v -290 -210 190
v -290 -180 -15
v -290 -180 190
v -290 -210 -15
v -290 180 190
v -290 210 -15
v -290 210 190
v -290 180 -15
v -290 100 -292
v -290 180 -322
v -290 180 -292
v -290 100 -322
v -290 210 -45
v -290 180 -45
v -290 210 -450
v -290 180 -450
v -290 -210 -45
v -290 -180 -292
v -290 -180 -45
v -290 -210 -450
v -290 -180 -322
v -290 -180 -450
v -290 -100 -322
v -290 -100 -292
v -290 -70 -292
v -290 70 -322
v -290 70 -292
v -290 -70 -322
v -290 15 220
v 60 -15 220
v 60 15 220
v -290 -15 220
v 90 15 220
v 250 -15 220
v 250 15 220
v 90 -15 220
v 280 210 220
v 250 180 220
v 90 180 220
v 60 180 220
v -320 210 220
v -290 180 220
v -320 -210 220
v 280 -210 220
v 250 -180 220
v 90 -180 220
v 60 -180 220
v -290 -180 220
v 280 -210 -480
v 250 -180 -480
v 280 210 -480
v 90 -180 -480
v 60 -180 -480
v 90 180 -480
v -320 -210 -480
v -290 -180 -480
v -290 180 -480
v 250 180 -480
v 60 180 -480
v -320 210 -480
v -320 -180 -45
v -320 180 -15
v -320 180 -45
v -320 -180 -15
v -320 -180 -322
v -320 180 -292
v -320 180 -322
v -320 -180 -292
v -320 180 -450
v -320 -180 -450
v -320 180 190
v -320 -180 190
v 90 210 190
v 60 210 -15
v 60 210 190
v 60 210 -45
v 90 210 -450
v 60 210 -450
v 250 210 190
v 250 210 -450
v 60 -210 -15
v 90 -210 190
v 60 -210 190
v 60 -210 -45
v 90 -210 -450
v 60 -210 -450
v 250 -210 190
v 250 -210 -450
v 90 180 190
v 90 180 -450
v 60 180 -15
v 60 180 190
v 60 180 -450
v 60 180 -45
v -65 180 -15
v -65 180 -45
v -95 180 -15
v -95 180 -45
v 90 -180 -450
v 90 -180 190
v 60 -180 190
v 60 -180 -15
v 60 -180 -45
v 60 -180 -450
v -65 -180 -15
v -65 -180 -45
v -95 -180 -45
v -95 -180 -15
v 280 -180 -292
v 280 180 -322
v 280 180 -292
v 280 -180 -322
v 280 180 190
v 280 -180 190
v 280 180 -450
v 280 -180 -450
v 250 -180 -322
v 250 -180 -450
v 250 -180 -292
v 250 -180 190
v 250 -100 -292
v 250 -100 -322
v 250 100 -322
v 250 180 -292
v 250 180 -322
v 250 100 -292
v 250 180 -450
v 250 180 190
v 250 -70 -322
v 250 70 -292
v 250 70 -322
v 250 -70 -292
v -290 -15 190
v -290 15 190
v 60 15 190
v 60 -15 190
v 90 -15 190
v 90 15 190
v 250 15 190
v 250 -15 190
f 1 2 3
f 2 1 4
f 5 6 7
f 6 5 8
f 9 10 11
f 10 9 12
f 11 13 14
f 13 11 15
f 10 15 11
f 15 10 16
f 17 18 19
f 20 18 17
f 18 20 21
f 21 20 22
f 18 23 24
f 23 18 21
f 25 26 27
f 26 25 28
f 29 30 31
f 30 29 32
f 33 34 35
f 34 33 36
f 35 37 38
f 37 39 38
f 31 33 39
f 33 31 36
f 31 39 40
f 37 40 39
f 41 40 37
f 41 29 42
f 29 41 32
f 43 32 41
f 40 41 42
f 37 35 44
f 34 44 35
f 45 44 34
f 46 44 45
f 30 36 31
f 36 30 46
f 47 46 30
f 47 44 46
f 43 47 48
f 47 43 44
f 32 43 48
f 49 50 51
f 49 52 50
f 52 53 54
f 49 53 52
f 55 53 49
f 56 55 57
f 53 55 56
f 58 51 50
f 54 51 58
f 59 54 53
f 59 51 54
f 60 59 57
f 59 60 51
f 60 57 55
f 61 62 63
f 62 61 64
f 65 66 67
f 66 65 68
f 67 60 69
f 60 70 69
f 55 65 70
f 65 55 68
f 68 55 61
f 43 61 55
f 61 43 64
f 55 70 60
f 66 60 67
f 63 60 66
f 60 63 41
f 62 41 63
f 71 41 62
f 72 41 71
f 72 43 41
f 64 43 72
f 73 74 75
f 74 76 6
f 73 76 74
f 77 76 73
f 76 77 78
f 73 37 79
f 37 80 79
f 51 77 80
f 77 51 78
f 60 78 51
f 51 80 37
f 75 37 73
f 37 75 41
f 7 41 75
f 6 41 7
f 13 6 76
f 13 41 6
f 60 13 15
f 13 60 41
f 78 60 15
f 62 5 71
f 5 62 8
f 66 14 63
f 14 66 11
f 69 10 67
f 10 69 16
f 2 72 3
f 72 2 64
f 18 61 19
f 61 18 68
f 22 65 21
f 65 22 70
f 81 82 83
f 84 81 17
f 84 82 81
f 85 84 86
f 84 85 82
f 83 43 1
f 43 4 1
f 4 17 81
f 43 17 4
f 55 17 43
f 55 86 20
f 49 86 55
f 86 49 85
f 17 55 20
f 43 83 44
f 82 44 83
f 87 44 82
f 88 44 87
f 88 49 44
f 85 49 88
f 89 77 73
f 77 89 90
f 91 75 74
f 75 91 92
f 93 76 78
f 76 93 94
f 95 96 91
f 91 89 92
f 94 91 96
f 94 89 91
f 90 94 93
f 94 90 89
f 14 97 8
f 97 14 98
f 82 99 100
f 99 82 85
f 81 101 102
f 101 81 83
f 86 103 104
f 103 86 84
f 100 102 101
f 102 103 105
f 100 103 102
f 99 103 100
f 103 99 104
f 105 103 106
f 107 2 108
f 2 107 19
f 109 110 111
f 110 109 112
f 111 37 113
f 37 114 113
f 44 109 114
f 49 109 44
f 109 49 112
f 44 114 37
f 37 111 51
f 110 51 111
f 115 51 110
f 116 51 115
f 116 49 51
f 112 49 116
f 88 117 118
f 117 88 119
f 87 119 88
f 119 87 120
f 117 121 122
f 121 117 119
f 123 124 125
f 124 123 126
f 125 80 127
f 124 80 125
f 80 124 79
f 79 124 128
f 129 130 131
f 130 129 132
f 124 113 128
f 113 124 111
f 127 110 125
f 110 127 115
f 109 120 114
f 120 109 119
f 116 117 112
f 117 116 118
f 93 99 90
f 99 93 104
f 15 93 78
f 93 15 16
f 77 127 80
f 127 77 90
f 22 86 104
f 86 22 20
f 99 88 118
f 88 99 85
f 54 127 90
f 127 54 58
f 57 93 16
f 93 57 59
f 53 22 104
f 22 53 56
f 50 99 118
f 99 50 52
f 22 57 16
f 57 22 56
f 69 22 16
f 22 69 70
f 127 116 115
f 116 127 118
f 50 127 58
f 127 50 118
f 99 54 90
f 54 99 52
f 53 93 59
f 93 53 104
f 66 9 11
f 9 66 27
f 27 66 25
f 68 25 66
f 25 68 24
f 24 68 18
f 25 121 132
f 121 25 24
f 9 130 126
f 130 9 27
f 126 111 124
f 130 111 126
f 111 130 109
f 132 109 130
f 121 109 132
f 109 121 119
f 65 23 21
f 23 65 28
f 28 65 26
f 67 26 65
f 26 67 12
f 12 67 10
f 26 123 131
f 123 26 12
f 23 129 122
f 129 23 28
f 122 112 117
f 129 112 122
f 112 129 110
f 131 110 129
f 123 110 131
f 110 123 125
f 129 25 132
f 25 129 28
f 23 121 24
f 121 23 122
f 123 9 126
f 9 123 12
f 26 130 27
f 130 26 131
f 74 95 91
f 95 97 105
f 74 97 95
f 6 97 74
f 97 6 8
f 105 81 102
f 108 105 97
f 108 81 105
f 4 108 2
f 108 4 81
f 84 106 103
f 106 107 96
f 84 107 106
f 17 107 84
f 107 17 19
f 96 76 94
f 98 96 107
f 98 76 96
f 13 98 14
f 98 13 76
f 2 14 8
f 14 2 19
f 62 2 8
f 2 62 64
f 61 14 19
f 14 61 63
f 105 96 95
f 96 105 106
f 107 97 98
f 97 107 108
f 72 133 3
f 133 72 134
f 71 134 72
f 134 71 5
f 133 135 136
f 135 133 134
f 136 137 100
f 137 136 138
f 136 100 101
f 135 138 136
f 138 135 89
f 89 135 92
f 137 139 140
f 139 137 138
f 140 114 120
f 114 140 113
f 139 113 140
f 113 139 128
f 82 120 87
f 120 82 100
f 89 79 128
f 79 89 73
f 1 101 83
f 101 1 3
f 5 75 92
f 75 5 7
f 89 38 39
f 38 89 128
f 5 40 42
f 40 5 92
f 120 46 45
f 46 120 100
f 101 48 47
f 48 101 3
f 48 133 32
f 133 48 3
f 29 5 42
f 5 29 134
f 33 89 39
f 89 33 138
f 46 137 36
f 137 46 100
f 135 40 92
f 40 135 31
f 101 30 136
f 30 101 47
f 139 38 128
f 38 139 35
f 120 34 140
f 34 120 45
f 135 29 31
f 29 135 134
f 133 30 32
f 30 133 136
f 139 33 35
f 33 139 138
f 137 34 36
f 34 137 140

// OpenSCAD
// file: _params.scad
// =========================================================================
// 공유 파라미터 (모든 개별 부품 파일에서 include)
// 메인 어셈블리: cup_z_x_catrage_frame_water_mic_anti_3030.scad 에서 추출
// 프레임: 600 × 420 × 700mm (3030 프로파일, Y=0 대칭)
// =========================================================================

$fn = 60;  // 부품 출력용 고해상도
GLOBAL_TOLERANCE = 0.2;

// --- [1] 하부 기성품 및 원통 파라미터 ---
X_RAIL_LEN = 290.0;
X_BLOCK_W = 30.0; X_BLOCK_L = 32.0;   // 신규 X슬라이더 블록 (폭 30mm × 길이 32mm)
X_PITCH_X = 20.0; X_PITCH_Y = 20.0;   // 체결 홀 피치 (20 × 20mm, M3 나사탭 4개)
X_RAIL_W = 30.0;  X_RAIL_H = 20.0;   // 레일 폭 30mm (레일 바닥~블록 윗면 높이 29mm 반영)
X_TOTAL_H = 29.0;                    // 레일 바닥에서 슬라이더 블록 윗면까지의 높이

MOTOR_W = 42.0;      MOTOR_PITCH = 31.0; MOTOR_HOLE_D = 3.5;    
MOTOR_BOSS_D = 22.0; MOTOR_BOSS_H = 2.0; SCREW_D = 8.0;         
MOT_BODY_L = 41.0;   SHAFT_L = 24.0;     // 실측 NEMA17 몸통 41mm / 축 돌출 24mm

CUP_ID = 99.5;  CUP_WALL = 5.0; CUP_OD = 110.0;     // 아크릴 원통 OD110/ID100
CUP_H = 180.0;   CAGE_H = 60.0;  FLOOR_H = 10.0; PISTON_H = 20.0;     

LIP_D = 30.0;    LIP_H = 5.0;    LEAK_DRAIN_D = 4.0;    
GUIDE_PIPE_D = 8.0; BUSHING_OD = 12.0; BUSHING_H = 8.0;       
DRAIN_RADIUS = 35.0; DRAIN_D = 8.0;        

Y_OFFSET = 85.0; BRKT_H = 12.0; BRKT_D = 122.0; BRKT_ID = 62.0; Z_MOUNT_PCD = 86.0;   

// --- [2] 아크릴 파이프 및 상부 카트리지 ---
ACRYL_ID = 100.0; ACRYL_T = 5.0; ACRYL_OD = ACRYL_ID + (ACRYL_T * 2);  // OD110 (아크릴집 106 재고없음 → 컵과 동일 규격)

REVOLVER_PCD = 240.0;     // 인접 카트리지 웹 9.8mm 확보 (OD110 대응, 230→240)
CARTRIDGE_OD = REVOLVER_PCD + ACRYL_OD + 8; 
TOP_PLATE_H = 15.0;       // 아크릴 15T 통판 (보스홀 단 깊이 10mm)

HUB_D = 60.0;            
SHAFT_D = 12.0;          
HUB_WALL = 4.0;          
HUB_H = 15.0;             // 아크릴 5T × 3장 적층 — 파이프 130mm 대응
POCKET_DEPTH = 5.0;
MID_HUB_Z = 63.5;          // 중단 허브 하면 Z (벨트 중심 Z=71.0mm 정렬, 풀리 상단 Z=75.0mm = 축상단-1mm)
UPPER_HUB_Z = 135.0;       // 상단 허브 하면 Z (전체 135+15=150 유지)
BOSS_OD = 35.0;
BOSS_H = 11.0;             // 보스11 + 와셔1 = 12, 리세스10 → 허브 2mm 공중

// --- [3] GT2 벨트 구동 시스템 ---
GT2_PITCH     = 2.0;
GT2_BELT_W    = 6.0;
BIG_PULLEY_TEETH = 566;
BIG_PULLEY_PD = BIG_PULLEY_TEETH * GT2_PITCH / PI;
BIG_PULLEY_OD = BIG_PULLEY_PD + 1.0;
SMALL_PULLEY_TEETH = 20;
SMALL_PULLEY_PD = SMALL_PULLEY_TEETH * GT2_PITCH / PI;
SMALL_PULLEY_OD = SMALL_PULLEY_PD + 1.0;

BELT_MOTOR_X = -300;
BELT_MOTOR_Y = -155.5;
BRKT_MOTOR_H = 25.0;
BRKT_MOTOR_W = 45.0;        // 브래킷 폭 45mm (프로파일 간섭 회피 복원)
SLOT_LEN = 10.0;
FLAG_W = 15.0;  FLAG_H = 8.0;  FLAG_T = 1.5;

X_POS_MEASURE = 170.0;   // 측정 브래킷 X좌표 (X_M~X_R 정중앙, X대칭)

// --- [4] 3030 프레임 경계 (600×430×700mm) ---
PF = 30;             // 3030 알루미늄 프로파일
WASHER_T = 1.0;     

X_L = -320;
X_M = 60;
X_R = 250;
Y_F = -210;          // 전방 (대칭: -210+30=-180, Y=0 중심)
Y_B = 180;           // 후방 (대칭: 180+30=210, Y=0 중심) — 메인파일과 동기화

Z_BOT = -480;
Z_RAIL = -322;
Z_MID = -TOP_PLATE_H - PF;
Z_TOP = 220;

SUPPORT_PILLAR_H = Z_TOP - PF;

SHAFT_SQ = 20;       // 2020 사각 회전축

// 사각 축 홀 크기
SQ = SHAFT_SQ + GLOBAL_TOLERANCE;  // 20.2mm

// --- 리볼버/컵 축 정렬 (보스홀=판 중심에 리볼버 정렬) ---
REVOLVER_CX = (X_L + X_M + PF)/2;        // 판 중심 = 보스홀 = 리볼버 회전축 (-115)
DROP_X      = REVOLVER_CX + REVOLVER_PCD/2;  // 링 드롭 / 컵 적재 축 (+5)

FLANGE_Z = 52.0;       // 모터 전면 안착 높이 (Z=52mm -> 축 상단 Z=76mm, 풀리 결합)

// --- [5] 모터 체결홀 (이미 제작 완료된 15T 상판 원본 도면 수치 100% 유지) ---
MOTOR_BOLT_PITCH     = 25.0;      // Y피치 (Y = ±12.5mm)
MOTOR_BOLT_X_NOMINAL = X_L + 55;  // 1열: 상판 좌단 55 (모터축 기준 +35mm = X=-265mm)
MOTOR_BOLT_X_SHIFT   = X_L + 40;  // 2열: 상판 좌단 40 (모터축 기준 +20mm = X=-280mm)

// 모터 마운트 볼트 카운터보어 (단볼트용 — 브래킷 두께 25 중 깊게 파냄)
MOTOR_CB_D     = 6.5;            // M3 캡볼트 머리 클리어런스
MOTOR_CB_DEPTH = 19;             // 카운터보어 깊이 (잔여 통과 6mm → M3×10 단볼트)
// main file
// =========================================================================
// [외주] 3030 알루미늄 프로파일 프레임 어셈블리
// 외곽: 600 × 420 × 700mm (Y=0 대칭)
// 기둥 6본 + 하부/중부/레일/상부 보
// =========================================================================
include <_params.scad>

module aluminum_profile_frame() { 
    // ── 기둥 6본 (수직) ──
    color([0.75, 0.75, 0.75]) { 
        translate([X_L, Y_B, Z_BOT]) cube([PF, PF, Z_TOP - Z_BOT]);
        translate([X_L, Y_F, Z_BOT]) cube([PF, PF, Z_TOP - Z_BOT]); 
        translate([X_M, Y_B, Z_BOT]) cube([PF, PF, Z_TOP - Z_BOT]);
        translate([X_M, Y_F, Z_BOT]) cube([PF, PF, Z_TOP - Z_BOT]); 
        translate([X_R, Y_B, Z_BOT]) cube([PF, PF, Z_TOP - Z_BOT]);
        translate([X_R, Y_F, Z_BOT]) cube([PF, PF, Z_TOP - Z_BOT]); 
    } 
    // ── 하부 보 (Z_BOT) ──
    color([0.65, 0.65, 0.65]) { 
        translate([X_L + PF, Y_B, Z_BOT]) cube([X_R - X_L - PF, PF, PF]);
        translate([X_L + PF, Y_F, Z_BOT]) cube([X_R - X_L - PF, PF, PF]); 
        translate([X_L, Y_F + PF, Z_BOT]) cube([PF, Y_B - Y_F - PF, PF]);
        translate([X_R, Y_F + PF, Z_BOT]) cube([PF, Y_B - Y_F - PF, PF]);
        translate([X_M, Y_F + PF, Z_BOT]) cube([PF, Y_B - Y_F - PF, PF]); 
    } 
    // ── 레일 보 (Z_RAIL) ──
    color([0.8, 0.8, 0.8]) { 
        translate([X_L, -Y_OFFSET - PF/2, Z_RAIL]) cube([X_R - X_L + PF, PF, PF]);
        translate([X_L, Y_OFFSET - PF/2, Z_RAIL]) cube([X_R - X_L + PF, PF, PF]); 
        translate([X_L, Y_F + PF, Z_RAIL]) cube([PF, Y_B - Y_F - PF, PF]);
        translate([X_R, Y_F + PF, Z_RAIL]) cube([PF, Y_B - Y_F - PF, PF]);
    } 
    // ── 중부 보 (Z_MID = 상판 하면) ──
    color([0.7, 0.7, 0.7]) { 
        translate([X_L + PF, Y_B, Z_MID]) cube([X_M - X_L - PF, PF, PF]);
        translate([X_L + PF, Y_F, Z_MID]) cube([X_M - X_L - PF, PF, PF]); 
        translate([X_L, Y_F + PF, Z_MID]) cube([PF, Y_B - Y_F - PF, PF]);
        translate([-95, Y_F + PF, Z_MID]) cube([PF, Y_B - Y_F - PF, PF]); 
    } 
    // ── 상부 보 (Z_TOP - PF) ──
    color([0.75, 0.75, 0.75]) { 
        translate([X_L + PF, Y_B, Z_TOP - PF]) cube([X_R - X_L - PF, PF, PF]);
        translate([X_L + PF, Y_F, Z_TOP - PF]) cube([X_R - X_L - PF, PF, PF]); 
        translate([X_L, Y_F + PF, Z_TOP - PF]) cube([PF, Y_B - Y_F - PF, PF]);
        translate([X_M, Y_F + PF, Z_TOP - PF]) cube([PF, Y_B - Y_F - PF, PF]);
        translate([X_R, Y_F + PF, Z_TOP - PF]) cube([PF, Y_B - Y_F - PF, PF]); 
    } 
    // ── 리볼버 축 보 (Y=0 중심) ──
    color([0.65, 0.65, 0.65]) { 
        translate([X_L + PF, -PF/2, Z_TOP - PF]) cube([X_M - X_L - PF, PF, PF]);
    } 
    // ── 측정 브래킷 장착용 가로보 ──
    color([0.75, 0.75, 0.75]) { 
        translate([X_M + PF, -PF/2, Z_TOP - PF]) cube([X_R - X_M - PF, PF, PF]); 
    } 
}

aluminum_profile_frame();
